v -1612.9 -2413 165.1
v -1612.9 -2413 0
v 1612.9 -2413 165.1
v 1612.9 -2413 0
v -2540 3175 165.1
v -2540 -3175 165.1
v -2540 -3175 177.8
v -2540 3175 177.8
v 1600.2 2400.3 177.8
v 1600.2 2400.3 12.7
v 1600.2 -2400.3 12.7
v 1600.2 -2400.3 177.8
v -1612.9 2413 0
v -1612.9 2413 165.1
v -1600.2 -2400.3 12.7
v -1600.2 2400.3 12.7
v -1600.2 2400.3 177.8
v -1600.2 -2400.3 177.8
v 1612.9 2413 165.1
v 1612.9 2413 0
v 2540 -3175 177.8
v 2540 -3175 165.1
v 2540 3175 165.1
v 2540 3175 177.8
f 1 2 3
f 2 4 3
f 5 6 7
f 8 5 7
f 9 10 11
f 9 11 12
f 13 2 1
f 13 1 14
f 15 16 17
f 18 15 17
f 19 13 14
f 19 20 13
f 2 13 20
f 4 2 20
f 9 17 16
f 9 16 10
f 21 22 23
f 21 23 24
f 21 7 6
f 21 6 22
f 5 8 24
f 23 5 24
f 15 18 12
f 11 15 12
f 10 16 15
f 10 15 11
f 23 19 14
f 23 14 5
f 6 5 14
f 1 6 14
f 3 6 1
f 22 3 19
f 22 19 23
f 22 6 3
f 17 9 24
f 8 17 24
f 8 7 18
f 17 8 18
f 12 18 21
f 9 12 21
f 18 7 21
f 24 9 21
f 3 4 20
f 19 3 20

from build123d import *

# Parameters (mm, degrees)
F0_W      = 3200.4
F0_H      = 4800.6
F1_DEPTH  = 12.7
F2_W      = 3225.8
F2_H      = 4826
F2_W_2    = 3200.4
F2_H_2    = 4800.6
F3_DEPTH  = 165.1
F4_W      = 4826
F4_H      = 12.7
F5_DEPTH  = 2540
F6_DEPTH  = 1600.2
F7_W      = 5080
F7_H      = 12.7
F8_DEPTH  = 3175
F9_W      = 3200.4
F9_H      = 12.7
F10_DEPTH = 2400.3


with BuildPart() as f1:
    # F0 (on Top) → F1 (new body)
    with BuildSketch(Plane.XY):
        Rectangle(F0_W, F0_H)
    extrude(amount=F1_DEPTH)

    # F2 (on Top) → F3 (join)
    with BuildSketch(Plane.XY):
        Rectangle(F2_W, F2_H)
        Rectangle(F2_W_2, F2_H_2, mode=Mode.SUBTRACT)
    extrude(amount=F3_DEPTH)

    # F4 (on Right) → F5 (join, symmetric)
    with BuildSketch(Plane.YZ):
        with Locations((0, 171.45)):
            Rectangle(F4_W, F4_H)
    extrude(amount=F5_DEPTH, both=True)

    # F4 (on Right) → F6 (cut, symmetric)
    with BuildSketch(Plane.YZ):
        with Locations((0, 171.45)):
            Rectangle(F4_W, F4_H)
    extrude(amount=F6_DEPTH, both=True, mode=Mode.SUBTRACT)

    # F7 (on Front) → F8 (join, symmetric)
    with BuildSketch(Plane.XZ):
        with Locations((0, 171.45)):
            Rectangle(F7_W, F7_H)
    extrude(amount=F8_DEPTH, both=True)

    # F9 (on Front) → F10 (cut, symmetric)
    with BuildSketch(Plane.XZ):
        with Locations((0, 171.45)):
            Rectangle(F9_W, F9_H)
    extrude(amount=F10_DEPTH, both=True, mode=Mode.SUBTRACT)


solid = f1.part
